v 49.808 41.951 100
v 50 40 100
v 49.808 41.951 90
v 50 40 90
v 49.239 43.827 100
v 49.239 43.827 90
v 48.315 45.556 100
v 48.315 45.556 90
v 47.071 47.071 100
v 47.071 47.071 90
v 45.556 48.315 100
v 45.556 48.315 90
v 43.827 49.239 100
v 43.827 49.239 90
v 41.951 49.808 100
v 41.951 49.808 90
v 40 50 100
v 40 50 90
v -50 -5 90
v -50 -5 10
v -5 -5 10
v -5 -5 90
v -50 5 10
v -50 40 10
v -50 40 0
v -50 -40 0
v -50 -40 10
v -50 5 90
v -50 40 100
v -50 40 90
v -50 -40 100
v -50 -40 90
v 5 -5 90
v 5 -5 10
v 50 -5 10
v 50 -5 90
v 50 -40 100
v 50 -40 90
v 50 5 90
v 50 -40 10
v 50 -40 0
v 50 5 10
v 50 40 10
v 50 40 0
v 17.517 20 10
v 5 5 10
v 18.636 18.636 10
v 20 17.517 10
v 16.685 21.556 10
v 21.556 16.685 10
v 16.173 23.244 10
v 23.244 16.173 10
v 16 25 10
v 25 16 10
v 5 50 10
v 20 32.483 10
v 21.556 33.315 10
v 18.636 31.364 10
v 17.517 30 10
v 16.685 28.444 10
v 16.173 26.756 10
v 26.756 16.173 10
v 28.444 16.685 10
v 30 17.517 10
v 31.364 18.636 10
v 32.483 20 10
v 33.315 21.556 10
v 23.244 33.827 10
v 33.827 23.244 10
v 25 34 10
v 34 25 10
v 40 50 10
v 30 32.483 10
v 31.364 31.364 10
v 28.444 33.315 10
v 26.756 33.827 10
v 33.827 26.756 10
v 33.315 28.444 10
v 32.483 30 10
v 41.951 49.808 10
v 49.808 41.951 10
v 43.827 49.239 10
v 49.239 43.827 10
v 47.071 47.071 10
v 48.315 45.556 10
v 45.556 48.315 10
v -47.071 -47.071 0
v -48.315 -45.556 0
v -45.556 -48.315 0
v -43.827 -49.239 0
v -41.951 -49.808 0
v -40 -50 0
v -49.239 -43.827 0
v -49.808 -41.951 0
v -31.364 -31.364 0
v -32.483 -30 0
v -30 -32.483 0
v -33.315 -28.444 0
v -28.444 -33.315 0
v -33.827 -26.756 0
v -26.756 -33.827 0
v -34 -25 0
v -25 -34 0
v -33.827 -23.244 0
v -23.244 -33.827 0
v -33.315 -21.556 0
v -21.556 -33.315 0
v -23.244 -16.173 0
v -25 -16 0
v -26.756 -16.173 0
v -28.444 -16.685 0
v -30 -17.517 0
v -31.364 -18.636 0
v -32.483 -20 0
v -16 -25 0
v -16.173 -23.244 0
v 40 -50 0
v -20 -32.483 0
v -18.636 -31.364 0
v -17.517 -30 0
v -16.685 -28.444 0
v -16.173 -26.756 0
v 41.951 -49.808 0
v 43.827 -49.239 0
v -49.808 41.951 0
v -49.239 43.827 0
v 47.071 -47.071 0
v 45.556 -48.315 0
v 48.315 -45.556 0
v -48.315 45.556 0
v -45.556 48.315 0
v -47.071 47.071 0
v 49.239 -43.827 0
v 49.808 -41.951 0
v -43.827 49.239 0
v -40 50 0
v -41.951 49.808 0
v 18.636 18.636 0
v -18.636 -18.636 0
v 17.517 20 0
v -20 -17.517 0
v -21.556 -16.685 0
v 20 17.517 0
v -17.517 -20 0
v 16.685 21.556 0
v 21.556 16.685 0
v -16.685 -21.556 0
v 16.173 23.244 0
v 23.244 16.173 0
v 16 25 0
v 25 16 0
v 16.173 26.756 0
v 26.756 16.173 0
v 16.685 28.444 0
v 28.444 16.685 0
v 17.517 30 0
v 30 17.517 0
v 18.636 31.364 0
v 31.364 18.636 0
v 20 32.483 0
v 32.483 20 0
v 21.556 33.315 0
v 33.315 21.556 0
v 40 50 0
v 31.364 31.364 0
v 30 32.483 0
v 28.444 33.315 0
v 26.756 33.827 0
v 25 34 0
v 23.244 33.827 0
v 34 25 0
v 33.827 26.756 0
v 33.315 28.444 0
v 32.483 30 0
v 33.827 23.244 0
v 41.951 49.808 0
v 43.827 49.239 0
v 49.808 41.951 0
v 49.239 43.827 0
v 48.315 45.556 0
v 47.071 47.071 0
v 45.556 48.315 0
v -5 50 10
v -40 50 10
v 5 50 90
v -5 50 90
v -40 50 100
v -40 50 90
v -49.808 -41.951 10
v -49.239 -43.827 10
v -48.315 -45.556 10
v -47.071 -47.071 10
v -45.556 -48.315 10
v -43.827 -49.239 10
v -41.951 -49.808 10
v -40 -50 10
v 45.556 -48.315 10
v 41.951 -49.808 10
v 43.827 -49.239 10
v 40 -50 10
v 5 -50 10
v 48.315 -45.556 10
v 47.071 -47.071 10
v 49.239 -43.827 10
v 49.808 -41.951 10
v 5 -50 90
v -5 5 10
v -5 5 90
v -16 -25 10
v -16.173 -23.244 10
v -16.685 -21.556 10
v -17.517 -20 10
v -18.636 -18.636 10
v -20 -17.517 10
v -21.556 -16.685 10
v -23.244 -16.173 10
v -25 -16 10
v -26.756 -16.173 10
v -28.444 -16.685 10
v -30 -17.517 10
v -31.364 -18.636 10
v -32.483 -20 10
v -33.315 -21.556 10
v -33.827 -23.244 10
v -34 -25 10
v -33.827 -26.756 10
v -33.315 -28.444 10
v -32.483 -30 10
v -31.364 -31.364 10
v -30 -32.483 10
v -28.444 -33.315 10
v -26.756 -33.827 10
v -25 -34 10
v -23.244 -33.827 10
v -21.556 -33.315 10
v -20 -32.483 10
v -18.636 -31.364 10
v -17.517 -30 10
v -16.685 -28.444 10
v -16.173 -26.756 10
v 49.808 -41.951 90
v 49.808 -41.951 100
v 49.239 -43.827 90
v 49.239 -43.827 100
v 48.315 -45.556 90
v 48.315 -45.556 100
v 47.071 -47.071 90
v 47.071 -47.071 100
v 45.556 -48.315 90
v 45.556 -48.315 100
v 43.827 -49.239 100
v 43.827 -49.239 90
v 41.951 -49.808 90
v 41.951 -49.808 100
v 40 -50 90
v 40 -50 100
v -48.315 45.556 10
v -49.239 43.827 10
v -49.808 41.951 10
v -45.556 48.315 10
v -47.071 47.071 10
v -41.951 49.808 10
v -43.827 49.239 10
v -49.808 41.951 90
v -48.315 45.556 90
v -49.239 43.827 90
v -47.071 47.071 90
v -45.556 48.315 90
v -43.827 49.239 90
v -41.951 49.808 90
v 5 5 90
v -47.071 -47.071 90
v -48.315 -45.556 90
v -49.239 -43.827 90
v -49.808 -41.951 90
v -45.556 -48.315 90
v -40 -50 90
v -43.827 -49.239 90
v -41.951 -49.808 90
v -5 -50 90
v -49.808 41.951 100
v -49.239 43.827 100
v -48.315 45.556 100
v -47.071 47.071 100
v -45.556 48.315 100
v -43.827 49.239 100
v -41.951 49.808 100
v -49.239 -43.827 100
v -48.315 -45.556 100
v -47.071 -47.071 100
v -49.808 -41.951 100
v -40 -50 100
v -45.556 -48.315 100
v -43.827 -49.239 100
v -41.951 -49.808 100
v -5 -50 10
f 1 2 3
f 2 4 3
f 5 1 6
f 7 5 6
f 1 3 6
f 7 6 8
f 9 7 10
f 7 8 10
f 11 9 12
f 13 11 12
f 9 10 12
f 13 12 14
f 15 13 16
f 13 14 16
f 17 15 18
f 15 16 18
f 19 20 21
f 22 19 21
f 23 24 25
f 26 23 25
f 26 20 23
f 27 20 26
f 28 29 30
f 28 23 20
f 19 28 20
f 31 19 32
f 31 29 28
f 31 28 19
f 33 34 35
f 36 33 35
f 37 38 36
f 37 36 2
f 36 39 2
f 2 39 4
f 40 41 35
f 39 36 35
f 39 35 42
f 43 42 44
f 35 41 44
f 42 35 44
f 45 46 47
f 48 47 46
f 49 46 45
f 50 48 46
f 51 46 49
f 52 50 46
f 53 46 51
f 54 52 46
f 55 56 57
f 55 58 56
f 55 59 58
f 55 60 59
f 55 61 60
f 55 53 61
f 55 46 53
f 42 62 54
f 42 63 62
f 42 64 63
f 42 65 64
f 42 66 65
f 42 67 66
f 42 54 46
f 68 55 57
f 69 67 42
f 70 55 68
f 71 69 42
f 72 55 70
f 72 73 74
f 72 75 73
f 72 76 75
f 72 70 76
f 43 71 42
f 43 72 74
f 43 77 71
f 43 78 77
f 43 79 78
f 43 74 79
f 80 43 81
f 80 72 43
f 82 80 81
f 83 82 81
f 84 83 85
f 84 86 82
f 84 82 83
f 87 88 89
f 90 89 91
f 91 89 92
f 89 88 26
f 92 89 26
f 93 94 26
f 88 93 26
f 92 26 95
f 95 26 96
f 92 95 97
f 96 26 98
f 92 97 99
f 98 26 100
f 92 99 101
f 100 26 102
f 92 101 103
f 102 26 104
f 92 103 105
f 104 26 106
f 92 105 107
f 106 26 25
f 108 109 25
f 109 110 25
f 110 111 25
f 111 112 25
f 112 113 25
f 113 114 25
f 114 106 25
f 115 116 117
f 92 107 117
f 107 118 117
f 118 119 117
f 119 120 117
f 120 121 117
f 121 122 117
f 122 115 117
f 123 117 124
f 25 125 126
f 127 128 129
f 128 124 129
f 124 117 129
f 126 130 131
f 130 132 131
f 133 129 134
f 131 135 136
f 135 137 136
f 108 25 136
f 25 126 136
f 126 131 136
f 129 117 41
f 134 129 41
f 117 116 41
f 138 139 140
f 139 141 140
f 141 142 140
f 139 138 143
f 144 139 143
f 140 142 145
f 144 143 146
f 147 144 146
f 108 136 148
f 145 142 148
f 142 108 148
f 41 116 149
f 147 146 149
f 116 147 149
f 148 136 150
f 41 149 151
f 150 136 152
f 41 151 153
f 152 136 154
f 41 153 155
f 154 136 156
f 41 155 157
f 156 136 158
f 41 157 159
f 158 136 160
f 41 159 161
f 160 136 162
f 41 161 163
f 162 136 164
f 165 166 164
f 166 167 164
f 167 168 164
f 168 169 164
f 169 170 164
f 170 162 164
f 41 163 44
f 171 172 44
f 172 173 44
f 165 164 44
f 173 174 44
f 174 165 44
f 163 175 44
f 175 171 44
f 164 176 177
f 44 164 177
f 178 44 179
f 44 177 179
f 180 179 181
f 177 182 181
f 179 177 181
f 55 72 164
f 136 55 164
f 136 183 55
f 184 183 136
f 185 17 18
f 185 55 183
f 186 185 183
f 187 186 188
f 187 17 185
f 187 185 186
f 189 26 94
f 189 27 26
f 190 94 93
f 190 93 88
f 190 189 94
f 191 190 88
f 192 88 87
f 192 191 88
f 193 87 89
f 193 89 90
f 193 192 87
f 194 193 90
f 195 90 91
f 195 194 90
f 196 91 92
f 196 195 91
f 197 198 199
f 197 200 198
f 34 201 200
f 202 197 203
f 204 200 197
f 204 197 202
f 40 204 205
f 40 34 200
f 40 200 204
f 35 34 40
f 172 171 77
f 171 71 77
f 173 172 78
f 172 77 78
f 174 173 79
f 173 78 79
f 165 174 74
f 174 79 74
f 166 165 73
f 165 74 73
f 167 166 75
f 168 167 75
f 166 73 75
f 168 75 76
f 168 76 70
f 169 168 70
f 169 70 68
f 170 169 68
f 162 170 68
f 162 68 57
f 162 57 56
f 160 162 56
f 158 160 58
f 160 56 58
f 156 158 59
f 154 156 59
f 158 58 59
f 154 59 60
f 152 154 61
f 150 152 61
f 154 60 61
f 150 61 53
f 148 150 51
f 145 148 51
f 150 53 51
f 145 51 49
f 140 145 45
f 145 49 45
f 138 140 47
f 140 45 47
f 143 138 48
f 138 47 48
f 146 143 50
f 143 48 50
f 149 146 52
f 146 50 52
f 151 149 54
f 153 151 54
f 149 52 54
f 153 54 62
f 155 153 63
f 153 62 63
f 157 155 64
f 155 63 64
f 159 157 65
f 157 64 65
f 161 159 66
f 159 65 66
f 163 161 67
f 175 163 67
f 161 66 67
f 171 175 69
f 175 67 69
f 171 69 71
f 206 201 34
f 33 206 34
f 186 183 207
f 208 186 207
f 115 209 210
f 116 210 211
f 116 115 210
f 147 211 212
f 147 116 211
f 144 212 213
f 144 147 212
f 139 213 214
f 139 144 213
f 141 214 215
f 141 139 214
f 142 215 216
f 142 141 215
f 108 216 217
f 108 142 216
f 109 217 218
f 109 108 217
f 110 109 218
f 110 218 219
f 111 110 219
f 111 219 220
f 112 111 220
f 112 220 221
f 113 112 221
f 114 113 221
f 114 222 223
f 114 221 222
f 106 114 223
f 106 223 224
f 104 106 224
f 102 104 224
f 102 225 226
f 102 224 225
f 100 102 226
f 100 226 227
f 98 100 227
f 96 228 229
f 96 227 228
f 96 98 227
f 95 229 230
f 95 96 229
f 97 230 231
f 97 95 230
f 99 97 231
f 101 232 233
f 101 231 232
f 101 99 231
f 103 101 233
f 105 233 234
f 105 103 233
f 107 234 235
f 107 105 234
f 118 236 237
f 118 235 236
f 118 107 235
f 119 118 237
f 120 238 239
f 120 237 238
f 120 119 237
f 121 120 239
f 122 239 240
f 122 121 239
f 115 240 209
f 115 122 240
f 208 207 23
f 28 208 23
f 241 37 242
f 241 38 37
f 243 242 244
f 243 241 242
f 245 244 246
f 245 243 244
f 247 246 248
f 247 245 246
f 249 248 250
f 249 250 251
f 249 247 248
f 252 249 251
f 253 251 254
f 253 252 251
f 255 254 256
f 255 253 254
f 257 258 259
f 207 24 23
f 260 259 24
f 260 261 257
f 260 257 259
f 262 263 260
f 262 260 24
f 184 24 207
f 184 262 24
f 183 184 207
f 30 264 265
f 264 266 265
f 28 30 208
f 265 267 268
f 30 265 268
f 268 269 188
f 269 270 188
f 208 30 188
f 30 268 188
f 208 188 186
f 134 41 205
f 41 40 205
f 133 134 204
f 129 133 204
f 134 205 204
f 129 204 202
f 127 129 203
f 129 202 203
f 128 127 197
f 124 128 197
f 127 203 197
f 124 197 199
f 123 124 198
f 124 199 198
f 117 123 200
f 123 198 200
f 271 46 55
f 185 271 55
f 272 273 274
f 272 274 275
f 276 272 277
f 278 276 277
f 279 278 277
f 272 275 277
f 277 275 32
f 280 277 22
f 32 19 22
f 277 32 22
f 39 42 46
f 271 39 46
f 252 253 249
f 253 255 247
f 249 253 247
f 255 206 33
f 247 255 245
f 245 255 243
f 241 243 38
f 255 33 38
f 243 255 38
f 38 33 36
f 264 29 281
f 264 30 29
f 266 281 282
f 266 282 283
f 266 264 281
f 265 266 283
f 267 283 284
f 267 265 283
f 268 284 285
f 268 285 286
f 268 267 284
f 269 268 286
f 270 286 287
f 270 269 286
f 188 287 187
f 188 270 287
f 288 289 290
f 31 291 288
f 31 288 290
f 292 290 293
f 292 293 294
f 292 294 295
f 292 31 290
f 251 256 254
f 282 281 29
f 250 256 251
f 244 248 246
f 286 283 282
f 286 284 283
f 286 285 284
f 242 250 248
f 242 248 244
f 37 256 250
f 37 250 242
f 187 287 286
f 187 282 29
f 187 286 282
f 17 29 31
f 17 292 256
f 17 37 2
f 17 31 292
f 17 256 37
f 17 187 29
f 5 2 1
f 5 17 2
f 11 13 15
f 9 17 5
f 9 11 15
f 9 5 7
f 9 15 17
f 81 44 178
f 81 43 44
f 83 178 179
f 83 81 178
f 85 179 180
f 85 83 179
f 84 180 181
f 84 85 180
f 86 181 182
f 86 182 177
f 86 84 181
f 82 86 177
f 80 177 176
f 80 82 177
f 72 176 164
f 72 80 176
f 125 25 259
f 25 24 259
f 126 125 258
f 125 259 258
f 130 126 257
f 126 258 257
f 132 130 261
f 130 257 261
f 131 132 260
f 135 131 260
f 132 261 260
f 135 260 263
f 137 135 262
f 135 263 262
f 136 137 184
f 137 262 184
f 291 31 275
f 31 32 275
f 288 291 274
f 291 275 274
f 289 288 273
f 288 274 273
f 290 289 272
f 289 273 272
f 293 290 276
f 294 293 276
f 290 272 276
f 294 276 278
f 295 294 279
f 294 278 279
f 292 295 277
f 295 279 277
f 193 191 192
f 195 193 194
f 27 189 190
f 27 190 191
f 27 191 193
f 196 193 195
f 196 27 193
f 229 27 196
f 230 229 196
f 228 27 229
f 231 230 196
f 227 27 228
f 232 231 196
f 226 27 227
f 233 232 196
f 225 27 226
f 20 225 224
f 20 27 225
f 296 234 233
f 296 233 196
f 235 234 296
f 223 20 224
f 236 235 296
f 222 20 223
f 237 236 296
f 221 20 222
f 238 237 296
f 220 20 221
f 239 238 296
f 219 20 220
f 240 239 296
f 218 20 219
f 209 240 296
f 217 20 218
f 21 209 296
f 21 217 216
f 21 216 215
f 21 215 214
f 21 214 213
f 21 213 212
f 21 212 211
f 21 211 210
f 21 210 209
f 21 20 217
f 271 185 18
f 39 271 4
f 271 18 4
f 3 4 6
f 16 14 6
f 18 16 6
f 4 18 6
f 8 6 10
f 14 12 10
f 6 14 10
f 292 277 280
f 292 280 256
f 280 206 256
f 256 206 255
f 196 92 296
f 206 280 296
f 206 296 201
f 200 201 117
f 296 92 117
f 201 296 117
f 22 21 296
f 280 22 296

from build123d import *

# Parameters (mm, degrees)
F1_DEPTH = 100
F2_W     = 100
F2_H     = 100
F3_DEPTH = 10
F4_W     = 45
F4_H     = 45
F5_DEPTH = 10
F6_R     = 10
F7_R     = 9
F8_DEPTH = 87


with BuildPart() as f1:
    # F0 (on Top) → F1 (new body)
    with BuildSketch(Plane.XY):
        Polygon((-5, -50), (0, -50), (5, -50), (5, -5), (50, -5), (50, 0), (50, 5), (5, 5), (5, 50), (0, 50), (-5, 50), (-5, 5), (-50, 5), (-50, 0), (-50, -5), (-5, -5), align=None)
    extrude(amount=F1_DEPTH)

    # F2 (on Top) → F3 (join)
    with BuildSketch(Plane.XY):
        Rectangle(F2_W, F2_H)
    extrude(amount=F3_DEPTH)

    # F4 (on face) → F5 (join)
    with BuildSketch(Plane.XY.offset(100)):
        with Locations((-27.5, 27.5)):
            Rectangle(F4_W, F4_H)
        Polygon((5, 50), (-5, 50), (-5, 5), (-50, 5), (-50, -5), (-5, -5), (-5, -50), (5, -50), (5, -5), (50, -5), (50, 5), (5, 5), align=None)
        with Locations((27.5, 27.5)):
            Rectangle(F4_W, F4_H)
        with Locations((27.5, -27.5)):
            Rectangle(F4_W, F4_H)
        with Locations((-27.5, -27.5)):
            Rectangle(F4_W, F4_H)
    extrude(amount=-F5_DEPTH)

    # F6
    f6_edges = [f1.edges().sort_by_distance(p)[0] for p in [
        (50, -50, 95),
        (50, -50, 5),
        (50, 50, 95),
        (50, 50, 5),
        (-50, -50, 95),
        (-50, -50, 5),
        (-50, 50, 95),
        (-50, 50, 5),
    ]]
    fillet(f6_edges, radius=F6_R)

    # F7 (on Top) → F8 (cut, symmetric)
    with BuildSketch(Plane.XY):
        with Locations((-25, -25)):
            Circle(F7_R)
        with Locations((25, 25)):
            Circle(F7_R)
    extrude(amount=F8_DEPTH, both=True, mode=Mode.SUBTRACT)


solid = f1.part
